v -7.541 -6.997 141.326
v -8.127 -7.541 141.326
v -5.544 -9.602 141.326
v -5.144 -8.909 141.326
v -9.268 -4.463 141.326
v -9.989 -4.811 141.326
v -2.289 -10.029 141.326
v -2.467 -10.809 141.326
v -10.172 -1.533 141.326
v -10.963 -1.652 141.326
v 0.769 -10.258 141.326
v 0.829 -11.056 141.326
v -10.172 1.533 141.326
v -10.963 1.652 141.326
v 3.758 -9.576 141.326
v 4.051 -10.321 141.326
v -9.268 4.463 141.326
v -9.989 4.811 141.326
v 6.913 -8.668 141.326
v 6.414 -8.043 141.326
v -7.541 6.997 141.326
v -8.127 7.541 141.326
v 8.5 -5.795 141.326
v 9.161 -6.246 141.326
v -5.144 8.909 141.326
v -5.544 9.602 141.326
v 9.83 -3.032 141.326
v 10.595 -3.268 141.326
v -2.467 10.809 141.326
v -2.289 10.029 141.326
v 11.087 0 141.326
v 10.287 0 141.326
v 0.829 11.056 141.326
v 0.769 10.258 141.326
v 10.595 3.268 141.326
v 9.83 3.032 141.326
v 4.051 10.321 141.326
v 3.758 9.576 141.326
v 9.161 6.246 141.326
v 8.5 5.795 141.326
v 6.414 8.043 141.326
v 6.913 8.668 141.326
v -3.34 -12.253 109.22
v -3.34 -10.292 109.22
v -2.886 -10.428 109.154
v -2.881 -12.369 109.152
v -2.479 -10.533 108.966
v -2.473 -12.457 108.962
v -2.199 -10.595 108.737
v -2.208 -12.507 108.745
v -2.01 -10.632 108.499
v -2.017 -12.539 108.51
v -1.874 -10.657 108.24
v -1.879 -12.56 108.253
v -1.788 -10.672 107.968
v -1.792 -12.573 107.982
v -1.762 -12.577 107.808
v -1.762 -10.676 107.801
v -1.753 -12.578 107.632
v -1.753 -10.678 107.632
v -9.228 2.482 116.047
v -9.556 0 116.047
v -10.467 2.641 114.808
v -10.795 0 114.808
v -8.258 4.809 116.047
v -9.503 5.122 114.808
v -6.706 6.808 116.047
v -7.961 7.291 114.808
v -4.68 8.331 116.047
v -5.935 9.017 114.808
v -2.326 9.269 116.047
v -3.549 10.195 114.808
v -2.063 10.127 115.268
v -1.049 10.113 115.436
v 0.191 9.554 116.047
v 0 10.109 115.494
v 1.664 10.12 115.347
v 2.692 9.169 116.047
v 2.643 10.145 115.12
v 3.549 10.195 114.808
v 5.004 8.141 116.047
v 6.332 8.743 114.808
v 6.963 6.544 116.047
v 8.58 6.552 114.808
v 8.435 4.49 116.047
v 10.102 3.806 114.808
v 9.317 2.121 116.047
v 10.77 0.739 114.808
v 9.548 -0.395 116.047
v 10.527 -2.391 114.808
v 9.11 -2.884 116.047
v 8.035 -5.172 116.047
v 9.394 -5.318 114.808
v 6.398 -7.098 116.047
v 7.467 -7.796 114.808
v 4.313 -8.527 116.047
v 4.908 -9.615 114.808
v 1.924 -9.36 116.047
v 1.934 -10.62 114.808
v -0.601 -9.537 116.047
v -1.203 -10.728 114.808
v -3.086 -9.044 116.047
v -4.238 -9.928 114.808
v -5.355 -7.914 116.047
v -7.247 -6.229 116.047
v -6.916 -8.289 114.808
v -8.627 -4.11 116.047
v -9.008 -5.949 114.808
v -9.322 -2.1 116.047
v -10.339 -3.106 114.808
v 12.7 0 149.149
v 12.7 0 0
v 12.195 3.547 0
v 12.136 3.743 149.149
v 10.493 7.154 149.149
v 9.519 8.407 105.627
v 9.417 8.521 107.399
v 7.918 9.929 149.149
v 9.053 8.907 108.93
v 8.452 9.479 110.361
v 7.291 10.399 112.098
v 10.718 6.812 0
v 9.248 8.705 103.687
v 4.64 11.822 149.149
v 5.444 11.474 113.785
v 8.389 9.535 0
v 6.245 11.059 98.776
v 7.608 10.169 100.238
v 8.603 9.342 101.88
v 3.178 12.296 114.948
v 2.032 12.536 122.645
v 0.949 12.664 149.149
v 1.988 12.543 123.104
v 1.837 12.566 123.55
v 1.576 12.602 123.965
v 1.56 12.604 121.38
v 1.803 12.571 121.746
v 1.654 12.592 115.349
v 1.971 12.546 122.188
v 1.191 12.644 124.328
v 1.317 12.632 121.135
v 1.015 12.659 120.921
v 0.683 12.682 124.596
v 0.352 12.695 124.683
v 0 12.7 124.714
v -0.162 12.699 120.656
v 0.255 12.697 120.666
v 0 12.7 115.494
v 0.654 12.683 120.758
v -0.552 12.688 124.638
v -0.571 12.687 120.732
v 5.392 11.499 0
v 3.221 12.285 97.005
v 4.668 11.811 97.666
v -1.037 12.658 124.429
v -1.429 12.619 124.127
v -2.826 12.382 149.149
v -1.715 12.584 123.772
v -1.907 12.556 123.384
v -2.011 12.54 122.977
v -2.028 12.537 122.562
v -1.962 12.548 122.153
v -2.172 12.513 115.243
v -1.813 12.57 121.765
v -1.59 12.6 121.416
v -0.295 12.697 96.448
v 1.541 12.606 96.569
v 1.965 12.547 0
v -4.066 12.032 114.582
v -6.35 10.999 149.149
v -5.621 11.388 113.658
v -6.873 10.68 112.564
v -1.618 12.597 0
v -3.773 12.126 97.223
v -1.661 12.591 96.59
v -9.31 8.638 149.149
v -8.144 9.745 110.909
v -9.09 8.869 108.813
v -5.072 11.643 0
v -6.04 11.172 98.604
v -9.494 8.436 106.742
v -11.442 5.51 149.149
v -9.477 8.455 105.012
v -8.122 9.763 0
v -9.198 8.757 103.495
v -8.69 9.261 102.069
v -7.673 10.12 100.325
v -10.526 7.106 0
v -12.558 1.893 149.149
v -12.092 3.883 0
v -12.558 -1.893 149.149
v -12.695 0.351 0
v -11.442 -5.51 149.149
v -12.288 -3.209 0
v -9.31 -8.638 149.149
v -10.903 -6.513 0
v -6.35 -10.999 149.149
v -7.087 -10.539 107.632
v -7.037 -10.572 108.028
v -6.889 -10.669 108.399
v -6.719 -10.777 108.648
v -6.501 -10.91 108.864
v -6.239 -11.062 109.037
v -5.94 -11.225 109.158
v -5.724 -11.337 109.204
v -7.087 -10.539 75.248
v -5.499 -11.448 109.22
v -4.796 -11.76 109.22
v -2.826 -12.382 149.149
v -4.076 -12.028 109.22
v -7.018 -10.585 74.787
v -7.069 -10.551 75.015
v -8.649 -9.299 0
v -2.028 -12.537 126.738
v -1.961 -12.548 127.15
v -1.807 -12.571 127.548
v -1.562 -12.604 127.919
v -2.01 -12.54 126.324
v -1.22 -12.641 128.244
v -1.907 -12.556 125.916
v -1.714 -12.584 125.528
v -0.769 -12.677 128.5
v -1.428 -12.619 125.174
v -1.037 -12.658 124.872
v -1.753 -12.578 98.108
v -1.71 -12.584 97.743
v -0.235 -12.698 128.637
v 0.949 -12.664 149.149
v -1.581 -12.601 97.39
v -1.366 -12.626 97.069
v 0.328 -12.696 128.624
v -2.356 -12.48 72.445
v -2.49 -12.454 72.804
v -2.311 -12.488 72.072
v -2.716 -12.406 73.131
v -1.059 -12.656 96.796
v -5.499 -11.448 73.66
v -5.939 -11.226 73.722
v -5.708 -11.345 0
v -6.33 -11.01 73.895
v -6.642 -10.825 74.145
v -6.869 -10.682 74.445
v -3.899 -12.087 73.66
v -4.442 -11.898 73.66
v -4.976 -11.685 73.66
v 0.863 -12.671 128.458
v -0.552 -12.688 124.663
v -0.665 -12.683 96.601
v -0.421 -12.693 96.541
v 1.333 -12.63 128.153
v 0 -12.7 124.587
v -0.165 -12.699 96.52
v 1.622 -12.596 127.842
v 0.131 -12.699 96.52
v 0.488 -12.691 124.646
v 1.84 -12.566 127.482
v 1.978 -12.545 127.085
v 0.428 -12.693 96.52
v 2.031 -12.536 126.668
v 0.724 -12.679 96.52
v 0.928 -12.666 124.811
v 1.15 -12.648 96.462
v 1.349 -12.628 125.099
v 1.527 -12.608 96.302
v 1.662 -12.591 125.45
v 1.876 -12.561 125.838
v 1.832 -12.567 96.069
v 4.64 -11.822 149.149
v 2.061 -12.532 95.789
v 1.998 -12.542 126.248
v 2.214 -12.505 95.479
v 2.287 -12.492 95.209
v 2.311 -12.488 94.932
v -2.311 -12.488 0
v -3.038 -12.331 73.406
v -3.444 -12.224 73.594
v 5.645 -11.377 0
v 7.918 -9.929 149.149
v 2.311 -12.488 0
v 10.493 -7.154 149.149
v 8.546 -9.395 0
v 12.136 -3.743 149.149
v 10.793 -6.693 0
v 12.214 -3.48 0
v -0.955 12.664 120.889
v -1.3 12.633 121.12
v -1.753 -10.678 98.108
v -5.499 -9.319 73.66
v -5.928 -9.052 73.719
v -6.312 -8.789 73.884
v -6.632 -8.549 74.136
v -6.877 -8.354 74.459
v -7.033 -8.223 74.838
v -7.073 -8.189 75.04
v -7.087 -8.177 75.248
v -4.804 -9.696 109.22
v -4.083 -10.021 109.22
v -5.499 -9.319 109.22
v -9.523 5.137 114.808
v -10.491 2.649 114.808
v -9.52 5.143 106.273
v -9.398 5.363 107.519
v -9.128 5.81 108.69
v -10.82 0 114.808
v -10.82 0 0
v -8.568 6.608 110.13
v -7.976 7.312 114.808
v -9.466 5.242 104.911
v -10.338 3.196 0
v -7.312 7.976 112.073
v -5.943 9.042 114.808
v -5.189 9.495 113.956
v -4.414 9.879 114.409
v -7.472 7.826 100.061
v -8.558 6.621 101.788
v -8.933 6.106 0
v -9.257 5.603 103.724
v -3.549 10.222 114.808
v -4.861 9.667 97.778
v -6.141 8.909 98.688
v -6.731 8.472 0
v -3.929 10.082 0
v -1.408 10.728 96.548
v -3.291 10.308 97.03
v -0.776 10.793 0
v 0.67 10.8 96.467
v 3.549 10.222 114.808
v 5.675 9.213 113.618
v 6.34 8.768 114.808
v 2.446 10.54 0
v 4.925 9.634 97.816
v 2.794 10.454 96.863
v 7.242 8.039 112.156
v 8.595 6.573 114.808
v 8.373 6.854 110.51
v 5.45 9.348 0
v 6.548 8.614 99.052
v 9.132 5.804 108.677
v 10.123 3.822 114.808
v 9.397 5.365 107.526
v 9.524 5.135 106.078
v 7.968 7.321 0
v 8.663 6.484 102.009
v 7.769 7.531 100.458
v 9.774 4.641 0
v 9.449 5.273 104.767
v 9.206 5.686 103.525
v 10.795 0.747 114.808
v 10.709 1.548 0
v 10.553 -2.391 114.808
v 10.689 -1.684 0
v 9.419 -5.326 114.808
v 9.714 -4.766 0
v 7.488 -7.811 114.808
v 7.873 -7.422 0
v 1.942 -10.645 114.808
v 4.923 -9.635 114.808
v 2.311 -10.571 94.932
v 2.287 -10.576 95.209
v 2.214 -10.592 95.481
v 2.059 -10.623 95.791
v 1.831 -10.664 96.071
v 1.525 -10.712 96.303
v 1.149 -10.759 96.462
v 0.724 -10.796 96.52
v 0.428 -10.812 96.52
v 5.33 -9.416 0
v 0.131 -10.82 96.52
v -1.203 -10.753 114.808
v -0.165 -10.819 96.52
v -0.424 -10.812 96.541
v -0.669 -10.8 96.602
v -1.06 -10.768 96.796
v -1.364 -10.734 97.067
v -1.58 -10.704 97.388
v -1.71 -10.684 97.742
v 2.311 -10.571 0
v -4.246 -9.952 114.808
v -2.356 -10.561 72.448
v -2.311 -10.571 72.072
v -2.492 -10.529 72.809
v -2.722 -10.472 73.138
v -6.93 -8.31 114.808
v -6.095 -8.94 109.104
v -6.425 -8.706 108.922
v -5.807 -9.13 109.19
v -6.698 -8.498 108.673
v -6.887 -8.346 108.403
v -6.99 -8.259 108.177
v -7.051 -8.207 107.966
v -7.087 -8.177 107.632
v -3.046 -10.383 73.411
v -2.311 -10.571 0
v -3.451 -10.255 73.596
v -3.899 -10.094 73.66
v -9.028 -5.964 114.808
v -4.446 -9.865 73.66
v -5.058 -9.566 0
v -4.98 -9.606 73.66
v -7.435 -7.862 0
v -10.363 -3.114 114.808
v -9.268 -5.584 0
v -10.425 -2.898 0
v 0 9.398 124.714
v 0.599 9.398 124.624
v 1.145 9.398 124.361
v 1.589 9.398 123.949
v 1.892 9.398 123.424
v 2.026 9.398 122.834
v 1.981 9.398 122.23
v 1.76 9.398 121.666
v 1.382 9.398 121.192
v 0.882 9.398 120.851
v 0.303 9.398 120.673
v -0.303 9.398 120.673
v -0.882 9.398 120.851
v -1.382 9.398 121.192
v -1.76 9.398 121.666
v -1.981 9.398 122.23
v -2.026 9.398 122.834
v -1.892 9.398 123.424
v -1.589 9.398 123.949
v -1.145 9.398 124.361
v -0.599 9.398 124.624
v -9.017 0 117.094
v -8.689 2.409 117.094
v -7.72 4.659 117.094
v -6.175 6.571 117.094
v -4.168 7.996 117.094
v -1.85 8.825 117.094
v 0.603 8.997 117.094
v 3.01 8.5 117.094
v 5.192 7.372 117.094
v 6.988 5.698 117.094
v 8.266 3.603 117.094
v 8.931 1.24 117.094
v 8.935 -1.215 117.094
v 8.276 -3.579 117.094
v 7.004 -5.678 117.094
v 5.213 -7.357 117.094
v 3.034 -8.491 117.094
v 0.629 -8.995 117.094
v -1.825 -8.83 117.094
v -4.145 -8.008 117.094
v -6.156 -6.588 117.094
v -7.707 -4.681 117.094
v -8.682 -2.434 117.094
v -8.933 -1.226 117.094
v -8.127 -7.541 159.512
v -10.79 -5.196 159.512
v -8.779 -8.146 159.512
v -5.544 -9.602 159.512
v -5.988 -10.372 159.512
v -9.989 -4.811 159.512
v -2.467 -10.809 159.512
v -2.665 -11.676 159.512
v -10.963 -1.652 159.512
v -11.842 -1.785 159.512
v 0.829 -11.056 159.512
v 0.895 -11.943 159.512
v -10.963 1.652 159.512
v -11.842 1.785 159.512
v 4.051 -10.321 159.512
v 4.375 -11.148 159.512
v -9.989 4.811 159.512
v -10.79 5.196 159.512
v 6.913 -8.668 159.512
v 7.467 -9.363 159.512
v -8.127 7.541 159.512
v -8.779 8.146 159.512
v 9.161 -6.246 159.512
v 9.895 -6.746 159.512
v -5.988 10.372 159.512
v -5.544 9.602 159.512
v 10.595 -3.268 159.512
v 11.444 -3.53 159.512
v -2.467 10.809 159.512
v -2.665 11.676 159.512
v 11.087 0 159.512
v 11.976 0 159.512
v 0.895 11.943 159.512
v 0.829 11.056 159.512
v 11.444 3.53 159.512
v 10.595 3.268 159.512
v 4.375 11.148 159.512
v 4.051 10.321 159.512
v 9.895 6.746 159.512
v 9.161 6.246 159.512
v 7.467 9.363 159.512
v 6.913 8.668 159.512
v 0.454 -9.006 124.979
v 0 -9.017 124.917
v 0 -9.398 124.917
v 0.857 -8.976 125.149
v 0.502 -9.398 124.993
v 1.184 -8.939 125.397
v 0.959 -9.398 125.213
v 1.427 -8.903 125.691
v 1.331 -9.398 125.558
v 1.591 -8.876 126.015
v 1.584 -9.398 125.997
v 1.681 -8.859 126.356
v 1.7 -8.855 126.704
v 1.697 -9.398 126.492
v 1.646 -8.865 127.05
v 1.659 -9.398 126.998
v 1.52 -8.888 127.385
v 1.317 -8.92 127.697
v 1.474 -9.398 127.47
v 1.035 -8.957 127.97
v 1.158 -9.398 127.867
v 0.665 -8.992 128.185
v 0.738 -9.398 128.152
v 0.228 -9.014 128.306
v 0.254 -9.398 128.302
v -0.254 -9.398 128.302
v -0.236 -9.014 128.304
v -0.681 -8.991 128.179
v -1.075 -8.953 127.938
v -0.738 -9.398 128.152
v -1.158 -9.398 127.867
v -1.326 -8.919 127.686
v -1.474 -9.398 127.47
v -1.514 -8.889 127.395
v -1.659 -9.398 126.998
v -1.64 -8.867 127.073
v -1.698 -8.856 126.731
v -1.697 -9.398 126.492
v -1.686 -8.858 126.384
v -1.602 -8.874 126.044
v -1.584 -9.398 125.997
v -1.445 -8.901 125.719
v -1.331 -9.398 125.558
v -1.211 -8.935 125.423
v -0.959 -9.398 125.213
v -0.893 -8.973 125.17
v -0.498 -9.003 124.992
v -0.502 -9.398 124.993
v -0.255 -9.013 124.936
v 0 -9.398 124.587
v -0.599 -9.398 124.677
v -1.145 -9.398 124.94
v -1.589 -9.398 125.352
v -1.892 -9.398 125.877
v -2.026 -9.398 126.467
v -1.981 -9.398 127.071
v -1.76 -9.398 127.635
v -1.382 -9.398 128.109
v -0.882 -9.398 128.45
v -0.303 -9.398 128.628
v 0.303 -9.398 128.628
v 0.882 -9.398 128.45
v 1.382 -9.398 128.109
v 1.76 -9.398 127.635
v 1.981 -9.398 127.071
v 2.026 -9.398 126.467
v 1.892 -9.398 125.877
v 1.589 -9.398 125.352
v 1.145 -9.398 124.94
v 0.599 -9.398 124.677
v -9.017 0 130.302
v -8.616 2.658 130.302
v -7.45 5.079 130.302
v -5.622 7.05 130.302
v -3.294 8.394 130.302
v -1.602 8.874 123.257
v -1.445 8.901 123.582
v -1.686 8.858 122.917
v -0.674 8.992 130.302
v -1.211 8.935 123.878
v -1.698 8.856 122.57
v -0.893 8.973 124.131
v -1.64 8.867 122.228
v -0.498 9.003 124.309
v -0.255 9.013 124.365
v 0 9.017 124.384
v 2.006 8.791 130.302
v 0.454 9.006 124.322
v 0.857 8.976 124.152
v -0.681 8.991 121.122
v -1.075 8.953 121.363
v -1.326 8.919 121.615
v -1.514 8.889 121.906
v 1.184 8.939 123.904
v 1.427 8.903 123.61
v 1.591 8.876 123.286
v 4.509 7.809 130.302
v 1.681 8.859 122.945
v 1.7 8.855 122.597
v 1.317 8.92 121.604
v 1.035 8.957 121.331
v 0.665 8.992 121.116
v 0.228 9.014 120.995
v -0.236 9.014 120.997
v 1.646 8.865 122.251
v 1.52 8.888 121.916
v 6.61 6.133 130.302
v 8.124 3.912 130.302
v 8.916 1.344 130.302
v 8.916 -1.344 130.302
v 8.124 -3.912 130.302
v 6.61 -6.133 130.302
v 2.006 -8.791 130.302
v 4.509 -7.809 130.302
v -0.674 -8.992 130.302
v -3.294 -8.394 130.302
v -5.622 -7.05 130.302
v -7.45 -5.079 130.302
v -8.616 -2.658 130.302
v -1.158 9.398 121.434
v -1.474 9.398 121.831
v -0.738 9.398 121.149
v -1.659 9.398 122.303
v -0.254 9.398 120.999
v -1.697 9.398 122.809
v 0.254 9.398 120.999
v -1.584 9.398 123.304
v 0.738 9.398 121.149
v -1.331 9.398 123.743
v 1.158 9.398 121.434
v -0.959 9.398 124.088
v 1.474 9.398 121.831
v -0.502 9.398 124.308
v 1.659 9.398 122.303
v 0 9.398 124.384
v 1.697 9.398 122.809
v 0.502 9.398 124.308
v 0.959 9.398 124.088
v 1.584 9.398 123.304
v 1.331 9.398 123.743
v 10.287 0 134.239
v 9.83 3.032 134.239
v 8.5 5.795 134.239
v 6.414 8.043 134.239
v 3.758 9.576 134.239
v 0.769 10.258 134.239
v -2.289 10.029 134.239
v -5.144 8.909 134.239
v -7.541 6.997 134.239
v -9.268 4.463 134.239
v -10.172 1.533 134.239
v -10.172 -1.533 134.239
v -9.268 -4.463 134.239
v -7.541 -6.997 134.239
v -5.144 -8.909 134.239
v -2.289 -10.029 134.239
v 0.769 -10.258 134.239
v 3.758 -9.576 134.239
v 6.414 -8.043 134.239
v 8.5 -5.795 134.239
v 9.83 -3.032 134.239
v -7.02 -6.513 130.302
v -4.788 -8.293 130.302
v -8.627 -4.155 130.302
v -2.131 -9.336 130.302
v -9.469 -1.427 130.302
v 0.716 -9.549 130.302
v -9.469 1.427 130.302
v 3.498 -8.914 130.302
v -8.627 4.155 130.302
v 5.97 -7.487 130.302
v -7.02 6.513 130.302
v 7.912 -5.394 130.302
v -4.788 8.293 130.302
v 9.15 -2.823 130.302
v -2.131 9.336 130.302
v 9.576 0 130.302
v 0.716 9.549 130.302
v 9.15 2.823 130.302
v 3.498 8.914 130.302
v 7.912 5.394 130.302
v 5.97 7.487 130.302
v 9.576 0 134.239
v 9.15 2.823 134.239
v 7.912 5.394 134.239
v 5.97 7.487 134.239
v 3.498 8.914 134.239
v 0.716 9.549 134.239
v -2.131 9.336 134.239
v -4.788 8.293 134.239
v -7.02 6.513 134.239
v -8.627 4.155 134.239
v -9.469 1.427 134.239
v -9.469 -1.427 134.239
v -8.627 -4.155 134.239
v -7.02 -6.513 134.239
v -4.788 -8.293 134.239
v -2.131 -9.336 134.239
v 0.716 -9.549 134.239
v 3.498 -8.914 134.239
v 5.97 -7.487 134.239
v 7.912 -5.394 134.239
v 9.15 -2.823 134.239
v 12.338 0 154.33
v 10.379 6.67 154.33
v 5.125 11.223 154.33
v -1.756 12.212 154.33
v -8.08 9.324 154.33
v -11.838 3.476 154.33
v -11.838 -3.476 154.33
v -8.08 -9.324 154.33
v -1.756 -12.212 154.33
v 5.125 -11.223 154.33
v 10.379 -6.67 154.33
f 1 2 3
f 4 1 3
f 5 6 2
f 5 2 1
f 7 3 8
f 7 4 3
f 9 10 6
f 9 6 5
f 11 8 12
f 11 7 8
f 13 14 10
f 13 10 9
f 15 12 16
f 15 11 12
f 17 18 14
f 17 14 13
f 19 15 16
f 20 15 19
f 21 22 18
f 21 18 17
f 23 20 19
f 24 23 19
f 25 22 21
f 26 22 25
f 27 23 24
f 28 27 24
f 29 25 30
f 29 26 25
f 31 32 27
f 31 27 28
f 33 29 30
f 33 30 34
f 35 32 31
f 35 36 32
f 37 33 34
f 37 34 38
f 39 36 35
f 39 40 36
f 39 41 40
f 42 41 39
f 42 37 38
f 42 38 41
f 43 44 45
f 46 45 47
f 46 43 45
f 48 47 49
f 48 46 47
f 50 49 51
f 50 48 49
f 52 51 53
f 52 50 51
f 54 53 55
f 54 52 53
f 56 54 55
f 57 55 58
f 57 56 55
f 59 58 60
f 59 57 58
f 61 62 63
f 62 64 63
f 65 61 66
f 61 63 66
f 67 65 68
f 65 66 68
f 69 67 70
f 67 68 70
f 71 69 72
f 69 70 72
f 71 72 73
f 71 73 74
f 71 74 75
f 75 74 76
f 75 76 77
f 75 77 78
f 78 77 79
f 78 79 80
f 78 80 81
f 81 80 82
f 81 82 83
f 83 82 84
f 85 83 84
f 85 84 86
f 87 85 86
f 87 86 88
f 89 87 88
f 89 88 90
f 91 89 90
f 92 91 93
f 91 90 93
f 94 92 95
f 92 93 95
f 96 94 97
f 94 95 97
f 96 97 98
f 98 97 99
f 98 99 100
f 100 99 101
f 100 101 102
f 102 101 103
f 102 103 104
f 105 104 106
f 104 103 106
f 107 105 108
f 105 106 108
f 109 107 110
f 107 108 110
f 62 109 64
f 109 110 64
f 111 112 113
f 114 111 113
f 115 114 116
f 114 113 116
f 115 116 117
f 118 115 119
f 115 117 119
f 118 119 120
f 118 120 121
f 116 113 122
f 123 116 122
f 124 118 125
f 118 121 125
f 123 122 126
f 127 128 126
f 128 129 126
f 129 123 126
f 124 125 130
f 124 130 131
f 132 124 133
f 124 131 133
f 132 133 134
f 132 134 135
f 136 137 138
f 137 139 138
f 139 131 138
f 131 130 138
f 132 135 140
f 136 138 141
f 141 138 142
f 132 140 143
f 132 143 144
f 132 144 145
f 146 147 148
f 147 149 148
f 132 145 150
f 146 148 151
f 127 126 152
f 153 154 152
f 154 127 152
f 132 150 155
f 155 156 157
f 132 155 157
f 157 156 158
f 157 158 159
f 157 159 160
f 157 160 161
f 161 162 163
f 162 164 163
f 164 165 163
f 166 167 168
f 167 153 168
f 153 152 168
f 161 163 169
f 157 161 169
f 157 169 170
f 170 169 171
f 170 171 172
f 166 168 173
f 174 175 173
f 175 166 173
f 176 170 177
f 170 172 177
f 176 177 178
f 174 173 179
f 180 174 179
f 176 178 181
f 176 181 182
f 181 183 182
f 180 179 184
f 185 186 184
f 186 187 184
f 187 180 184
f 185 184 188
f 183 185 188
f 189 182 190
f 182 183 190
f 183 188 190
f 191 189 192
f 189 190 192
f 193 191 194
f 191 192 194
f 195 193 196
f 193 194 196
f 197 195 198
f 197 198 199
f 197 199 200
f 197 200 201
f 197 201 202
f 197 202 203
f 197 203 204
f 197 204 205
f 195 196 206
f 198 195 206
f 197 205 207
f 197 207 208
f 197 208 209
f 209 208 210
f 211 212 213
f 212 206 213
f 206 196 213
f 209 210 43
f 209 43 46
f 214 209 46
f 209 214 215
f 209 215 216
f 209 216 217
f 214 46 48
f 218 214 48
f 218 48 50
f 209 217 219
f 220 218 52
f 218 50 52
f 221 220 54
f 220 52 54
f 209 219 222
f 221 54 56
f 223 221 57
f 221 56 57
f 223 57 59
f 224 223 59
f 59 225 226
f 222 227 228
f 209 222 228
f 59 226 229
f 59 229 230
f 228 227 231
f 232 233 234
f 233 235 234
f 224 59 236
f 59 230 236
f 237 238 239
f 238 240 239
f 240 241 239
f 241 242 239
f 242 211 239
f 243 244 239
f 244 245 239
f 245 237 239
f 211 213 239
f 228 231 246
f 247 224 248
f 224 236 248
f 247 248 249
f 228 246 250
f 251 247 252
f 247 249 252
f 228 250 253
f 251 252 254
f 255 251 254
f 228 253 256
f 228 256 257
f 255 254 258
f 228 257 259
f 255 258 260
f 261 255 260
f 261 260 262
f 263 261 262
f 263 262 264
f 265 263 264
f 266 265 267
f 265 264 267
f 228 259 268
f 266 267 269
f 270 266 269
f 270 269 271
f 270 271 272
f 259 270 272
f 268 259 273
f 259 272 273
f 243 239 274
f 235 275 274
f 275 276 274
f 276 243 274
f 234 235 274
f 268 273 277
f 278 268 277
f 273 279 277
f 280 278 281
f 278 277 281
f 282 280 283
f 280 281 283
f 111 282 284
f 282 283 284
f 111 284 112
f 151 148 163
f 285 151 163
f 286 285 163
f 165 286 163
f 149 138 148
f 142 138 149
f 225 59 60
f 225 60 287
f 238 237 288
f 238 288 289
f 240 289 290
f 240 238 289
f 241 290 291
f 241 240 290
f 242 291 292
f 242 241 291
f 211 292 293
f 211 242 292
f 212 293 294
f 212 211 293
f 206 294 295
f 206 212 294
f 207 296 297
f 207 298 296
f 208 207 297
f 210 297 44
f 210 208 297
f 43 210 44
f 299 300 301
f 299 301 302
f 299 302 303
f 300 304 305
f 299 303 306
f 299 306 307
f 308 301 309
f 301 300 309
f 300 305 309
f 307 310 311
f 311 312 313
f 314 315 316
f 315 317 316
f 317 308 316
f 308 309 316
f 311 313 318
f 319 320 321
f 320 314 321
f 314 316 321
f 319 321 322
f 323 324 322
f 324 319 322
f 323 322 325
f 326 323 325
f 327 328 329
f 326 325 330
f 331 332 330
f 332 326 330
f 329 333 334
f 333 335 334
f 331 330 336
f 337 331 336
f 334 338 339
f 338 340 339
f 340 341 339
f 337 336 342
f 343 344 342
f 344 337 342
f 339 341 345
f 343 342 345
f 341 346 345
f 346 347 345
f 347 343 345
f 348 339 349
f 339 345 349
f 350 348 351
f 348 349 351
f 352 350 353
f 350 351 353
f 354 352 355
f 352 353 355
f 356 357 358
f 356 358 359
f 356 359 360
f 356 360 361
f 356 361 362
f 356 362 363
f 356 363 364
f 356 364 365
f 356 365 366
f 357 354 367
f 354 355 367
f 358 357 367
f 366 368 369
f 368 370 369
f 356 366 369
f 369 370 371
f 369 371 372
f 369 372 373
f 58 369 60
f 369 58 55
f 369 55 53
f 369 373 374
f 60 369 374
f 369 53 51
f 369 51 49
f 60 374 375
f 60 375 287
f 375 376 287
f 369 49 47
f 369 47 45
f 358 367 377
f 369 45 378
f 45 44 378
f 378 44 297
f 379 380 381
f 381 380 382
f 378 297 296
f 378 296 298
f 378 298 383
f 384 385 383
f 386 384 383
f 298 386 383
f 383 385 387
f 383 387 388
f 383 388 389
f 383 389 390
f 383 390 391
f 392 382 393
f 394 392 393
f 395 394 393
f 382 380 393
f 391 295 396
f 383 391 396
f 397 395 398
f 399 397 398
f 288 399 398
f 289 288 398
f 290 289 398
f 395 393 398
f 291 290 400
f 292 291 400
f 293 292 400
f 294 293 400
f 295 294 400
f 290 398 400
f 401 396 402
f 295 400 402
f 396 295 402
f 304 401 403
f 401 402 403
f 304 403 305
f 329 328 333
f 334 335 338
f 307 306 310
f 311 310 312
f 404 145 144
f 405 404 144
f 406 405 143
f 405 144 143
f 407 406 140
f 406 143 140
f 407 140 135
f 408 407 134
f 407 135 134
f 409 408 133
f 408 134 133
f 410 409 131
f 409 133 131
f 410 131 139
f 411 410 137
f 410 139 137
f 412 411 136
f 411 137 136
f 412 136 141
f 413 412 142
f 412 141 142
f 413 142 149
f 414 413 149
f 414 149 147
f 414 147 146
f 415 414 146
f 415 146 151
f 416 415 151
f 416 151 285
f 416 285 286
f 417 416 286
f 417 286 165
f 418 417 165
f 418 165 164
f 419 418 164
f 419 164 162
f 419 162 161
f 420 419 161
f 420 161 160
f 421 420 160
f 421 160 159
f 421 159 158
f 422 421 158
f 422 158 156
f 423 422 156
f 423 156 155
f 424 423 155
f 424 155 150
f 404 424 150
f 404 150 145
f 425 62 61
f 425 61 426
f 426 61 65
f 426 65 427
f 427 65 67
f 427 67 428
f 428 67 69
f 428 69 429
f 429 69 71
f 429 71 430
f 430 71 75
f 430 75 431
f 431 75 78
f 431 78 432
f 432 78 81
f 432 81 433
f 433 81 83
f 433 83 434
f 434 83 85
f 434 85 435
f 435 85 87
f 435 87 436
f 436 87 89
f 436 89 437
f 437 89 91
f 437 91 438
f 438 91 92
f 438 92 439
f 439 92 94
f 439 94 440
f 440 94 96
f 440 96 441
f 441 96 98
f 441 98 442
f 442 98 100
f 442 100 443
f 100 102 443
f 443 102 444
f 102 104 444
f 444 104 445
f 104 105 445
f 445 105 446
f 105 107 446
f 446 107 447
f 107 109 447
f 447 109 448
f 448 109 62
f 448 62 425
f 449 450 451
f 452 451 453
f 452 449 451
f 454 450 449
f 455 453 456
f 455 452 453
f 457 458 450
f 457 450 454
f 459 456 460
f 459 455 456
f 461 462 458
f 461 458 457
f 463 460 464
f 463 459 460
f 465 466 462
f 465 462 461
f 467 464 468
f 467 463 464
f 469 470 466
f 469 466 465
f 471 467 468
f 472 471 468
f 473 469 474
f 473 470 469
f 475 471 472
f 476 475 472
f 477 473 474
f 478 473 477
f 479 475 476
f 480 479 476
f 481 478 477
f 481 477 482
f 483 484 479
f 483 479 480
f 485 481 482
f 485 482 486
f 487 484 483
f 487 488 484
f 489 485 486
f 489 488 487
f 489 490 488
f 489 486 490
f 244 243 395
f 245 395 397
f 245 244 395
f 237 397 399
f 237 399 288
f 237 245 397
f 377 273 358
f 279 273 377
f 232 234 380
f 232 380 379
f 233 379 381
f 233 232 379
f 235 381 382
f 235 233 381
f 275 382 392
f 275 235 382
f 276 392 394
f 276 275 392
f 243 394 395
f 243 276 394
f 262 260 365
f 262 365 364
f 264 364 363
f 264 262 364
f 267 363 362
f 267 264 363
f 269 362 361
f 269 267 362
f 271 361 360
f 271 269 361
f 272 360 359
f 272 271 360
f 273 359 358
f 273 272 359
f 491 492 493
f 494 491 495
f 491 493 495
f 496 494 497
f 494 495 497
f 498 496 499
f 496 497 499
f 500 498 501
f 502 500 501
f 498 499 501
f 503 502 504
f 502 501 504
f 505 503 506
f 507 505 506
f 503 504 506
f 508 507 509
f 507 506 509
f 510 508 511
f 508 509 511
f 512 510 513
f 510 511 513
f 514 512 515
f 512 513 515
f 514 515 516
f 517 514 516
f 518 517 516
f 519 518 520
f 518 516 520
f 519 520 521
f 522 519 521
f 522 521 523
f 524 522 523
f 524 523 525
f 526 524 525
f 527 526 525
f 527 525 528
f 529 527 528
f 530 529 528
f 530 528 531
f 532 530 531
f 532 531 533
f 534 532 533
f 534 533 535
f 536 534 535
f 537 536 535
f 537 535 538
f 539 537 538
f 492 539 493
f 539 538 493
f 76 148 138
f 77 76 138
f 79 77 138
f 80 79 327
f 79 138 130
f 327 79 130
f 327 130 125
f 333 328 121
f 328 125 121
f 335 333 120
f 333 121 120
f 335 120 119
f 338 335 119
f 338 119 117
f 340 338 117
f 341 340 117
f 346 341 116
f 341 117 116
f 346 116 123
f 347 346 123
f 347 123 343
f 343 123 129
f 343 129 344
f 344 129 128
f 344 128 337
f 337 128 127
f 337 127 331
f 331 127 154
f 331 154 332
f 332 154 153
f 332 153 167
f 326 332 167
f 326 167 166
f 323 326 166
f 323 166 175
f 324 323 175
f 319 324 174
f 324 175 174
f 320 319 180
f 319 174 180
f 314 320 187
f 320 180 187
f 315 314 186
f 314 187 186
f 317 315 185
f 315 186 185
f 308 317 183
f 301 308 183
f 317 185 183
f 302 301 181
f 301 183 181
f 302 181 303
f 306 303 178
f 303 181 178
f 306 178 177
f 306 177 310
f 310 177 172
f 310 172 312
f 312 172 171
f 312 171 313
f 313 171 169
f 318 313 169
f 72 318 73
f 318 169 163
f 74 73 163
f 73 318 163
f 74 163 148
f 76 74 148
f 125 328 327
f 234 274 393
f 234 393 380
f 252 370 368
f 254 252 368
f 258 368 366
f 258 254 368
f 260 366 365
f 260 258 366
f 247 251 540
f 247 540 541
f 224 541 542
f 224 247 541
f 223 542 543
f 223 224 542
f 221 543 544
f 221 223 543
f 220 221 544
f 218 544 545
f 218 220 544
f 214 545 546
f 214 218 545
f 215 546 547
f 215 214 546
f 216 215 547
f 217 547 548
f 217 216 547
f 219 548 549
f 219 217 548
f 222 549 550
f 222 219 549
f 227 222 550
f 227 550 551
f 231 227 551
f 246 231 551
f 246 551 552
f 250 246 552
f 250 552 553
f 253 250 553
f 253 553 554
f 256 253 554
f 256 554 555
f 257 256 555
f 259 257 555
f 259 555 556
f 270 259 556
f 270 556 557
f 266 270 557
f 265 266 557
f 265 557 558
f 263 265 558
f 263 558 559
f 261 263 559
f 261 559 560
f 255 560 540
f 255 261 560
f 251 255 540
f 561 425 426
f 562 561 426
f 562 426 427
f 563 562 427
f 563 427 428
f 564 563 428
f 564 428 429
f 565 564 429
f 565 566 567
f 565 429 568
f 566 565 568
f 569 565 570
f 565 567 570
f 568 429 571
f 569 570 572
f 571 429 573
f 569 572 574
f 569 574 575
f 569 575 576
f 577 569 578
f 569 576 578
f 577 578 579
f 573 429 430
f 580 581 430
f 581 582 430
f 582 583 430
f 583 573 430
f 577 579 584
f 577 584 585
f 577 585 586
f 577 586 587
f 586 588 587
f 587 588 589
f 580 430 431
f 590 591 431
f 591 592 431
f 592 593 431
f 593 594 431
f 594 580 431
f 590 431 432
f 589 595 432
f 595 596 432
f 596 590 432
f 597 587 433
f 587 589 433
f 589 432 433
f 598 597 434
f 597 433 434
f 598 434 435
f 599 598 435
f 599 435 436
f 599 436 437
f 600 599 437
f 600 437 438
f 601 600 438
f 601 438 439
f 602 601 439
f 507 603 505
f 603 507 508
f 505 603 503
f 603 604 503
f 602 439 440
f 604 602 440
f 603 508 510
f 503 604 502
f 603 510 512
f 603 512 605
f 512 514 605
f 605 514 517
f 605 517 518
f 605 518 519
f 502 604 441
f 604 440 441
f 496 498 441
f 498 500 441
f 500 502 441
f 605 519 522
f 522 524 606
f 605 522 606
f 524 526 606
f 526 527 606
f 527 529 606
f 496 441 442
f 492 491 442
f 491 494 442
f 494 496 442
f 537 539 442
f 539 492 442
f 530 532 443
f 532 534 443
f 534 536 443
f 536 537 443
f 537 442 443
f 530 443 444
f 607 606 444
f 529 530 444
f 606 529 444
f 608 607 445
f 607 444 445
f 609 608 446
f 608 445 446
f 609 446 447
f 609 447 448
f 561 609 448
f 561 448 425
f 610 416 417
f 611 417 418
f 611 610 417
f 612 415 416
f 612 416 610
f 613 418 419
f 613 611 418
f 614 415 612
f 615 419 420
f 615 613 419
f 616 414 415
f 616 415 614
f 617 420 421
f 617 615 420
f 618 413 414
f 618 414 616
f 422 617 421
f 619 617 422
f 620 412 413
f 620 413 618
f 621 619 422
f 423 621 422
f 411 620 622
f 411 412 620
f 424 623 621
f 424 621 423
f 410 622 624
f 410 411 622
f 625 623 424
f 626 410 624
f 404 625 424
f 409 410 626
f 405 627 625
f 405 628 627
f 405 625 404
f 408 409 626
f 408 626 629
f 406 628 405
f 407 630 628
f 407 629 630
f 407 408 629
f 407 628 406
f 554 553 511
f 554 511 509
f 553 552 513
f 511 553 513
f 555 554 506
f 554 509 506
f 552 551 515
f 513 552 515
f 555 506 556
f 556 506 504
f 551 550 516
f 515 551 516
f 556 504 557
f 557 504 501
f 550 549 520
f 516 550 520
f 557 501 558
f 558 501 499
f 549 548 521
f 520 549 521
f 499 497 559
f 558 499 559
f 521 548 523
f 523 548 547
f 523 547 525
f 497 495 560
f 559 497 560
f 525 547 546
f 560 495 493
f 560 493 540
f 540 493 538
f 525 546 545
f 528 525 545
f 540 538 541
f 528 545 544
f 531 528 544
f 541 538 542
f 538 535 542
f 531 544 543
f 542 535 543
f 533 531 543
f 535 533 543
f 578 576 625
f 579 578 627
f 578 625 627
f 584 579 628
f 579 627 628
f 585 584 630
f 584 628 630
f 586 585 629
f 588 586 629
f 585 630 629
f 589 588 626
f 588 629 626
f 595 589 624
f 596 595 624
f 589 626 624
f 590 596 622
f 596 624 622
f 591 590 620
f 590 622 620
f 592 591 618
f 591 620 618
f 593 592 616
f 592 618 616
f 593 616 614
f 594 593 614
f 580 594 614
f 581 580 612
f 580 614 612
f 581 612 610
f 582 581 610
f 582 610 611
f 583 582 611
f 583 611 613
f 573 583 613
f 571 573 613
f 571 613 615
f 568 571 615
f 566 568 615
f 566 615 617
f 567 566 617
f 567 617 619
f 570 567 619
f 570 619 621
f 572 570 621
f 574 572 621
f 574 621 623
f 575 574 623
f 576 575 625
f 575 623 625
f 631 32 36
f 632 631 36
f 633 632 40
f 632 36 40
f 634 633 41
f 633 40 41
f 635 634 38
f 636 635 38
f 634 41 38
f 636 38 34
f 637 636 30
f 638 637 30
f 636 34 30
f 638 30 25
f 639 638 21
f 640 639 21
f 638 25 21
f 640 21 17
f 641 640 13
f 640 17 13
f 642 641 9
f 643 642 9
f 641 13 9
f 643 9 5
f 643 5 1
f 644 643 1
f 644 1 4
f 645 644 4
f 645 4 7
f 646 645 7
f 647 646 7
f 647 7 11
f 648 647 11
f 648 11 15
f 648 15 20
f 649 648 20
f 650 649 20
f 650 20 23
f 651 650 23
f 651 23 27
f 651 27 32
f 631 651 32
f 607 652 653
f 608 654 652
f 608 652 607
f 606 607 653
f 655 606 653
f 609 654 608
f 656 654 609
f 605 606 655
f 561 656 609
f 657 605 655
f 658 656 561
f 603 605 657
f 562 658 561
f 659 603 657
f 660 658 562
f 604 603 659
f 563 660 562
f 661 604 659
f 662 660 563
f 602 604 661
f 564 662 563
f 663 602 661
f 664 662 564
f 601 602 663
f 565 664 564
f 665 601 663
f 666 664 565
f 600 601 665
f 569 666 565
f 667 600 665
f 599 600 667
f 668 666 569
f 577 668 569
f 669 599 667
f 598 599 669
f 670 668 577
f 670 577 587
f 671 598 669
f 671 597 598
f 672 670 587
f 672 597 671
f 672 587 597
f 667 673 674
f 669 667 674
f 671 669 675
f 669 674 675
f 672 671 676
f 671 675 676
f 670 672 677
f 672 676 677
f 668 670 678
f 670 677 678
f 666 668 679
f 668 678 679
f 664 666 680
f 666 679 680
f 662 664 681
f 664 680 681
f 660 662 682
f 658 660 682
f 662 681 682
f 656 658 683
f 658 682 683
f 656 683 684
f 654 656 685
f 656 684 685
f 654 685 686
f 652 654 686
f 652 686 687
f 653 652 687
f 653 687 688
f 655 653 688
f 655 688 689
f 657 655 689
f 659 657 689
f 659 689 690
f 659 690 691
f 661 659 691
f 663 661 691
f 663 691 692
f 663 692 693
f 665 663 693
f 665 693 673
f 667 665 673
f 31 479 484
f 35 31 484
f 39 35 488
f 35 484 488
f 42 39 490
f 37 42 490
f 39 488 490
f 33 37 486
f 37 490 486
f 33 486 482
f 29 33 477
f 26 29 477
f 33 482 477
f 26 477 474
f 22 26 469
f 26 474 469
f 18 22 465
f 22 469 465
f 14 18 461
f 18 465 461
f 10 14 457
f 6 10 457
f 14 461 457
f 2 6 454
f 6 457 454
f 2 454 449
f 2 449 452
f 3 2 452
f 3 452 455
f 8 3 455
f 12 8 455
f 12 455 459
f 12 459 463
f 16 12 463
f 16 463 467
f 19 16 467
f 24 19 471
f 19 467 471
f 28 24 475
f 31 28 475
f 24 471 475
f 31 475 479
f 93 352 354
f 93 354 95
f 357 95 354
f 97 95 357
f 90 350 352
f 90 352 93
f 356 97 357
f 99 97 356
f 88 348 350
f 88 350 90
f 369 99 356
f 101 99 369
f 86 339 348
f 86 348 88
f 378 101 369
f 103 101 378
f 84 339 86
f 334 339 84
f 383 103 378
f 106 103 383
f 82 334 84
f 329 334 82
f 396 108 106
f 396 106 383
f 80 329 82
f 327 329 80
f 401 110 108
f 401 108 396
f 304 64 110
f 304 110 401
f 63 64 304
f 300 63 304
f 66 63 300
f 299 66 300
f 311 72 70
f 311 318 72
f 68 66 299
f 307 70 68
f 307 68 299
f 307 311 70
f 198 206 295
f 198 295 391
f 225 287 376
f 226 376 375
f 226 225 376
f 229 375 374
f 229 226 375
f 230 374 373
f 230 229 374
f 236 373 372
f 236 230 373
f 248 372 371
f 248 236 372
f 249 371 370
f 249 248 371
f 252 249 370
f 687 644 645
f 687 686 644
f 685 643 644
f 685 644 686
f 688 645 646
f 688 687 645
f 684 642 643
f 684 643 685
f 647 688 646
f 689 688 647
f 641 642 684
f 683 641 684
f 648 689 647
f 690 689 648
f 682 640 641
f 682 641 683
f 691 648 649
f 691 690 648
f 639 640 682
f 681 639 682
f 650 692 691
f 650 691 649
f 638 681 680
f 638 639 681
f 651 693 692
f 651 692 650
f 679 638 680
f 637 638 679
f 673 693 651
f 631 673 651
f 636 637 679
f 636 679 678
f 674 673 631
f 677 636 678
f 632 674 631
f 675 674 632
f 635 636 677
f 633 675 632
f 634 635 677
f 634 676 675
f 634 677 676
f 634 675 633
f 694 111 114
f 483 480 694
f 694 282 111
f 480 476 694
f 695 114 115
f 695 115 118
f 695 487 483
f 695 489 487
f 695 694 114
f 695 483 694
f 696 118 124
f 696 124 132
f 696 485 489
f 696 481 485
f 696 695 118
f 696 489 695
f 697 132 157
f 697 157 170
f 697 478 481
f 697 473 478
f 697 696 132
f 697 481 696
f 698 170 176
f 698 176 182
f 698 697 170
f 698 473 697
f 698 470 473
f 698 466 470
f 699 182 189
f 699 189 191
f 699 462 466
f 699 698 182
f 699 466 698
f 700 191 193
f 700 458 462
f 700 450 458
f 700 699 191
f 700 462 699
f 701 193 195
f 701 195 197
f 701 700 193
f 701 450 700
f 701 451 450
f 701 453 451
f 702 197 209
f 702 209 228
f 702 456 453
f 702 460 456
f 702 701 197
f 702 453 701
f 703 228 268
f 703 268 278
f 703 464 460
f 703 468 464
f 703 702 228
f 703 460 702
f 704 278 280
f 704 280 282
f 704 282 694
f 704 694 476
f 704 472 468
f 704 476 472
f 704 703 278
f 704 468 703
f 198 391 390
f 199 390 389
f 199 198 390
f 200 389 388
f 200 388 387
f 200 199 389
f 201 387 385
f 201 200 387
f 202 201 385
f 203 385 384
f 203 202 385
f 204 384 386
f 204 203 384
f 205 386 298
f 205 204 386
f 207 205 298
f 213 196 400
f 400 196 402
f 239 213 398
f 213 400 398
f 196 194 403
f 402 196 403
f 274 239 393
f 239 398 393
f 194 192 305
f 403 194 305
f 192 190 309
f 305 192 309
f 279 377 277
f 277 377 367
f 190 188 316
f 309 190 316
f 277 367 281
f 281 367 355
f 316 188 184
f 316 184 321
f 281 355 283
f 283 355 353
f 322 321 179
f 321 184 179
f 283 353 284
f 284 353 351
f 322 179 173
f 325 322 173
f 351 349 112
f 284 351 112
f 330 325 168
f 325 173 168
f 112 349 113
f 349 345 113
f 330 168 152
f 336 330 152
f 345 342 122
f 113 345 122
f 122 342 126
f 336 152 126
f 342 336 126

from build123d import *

# Parameters (mm, degrees)
SKETCH1_R           = 12.7
EXTRUDE1_DEPTH      = 159.512
SKETCH3_R           = 10.8204
CUT_EXTRUDE1_DEPTH  = 114.808
SKETCH4_R           = 9.017
CUT_EXTRUDE2_DEPTH  = 45.704
CHAMFER1_SIZE       = 1.778
CHAMFER2_SIZE       = 0.762
CHAMFER2_SIZE2      = 0.508
SKETCH5_R           = 9.5758
CUT_EXTRUDE3_DEPTH  = 29.21
SKETCH8_R           = 10.287
CUT_EXTRUDE5_DEPTH  = 25.273
SKETCH9_R           = 11.0871
CUT_EXTRUDE6_DEPTH  = 18.1864
CHAMFER3_SIZE       = 10.3632
CHAMFER3_SIZE2      = 0.7239
CUT_EXTRUDE7_DEPTH  = 7.62
SKETCH11_R          = 2.032
CUT_EXTRUDE11_DEPTH = 3.302
SKETCH15_R          = 1.7018
CUT_EXTRUDE12_DEPTH = 3.302
SKETCH16_R          = 9.525
CUT_EXTRUDE13_DEPTH = 12.7
SKETCH17_R          = 2.032
CUT_EXTRUDE14_DEPTH = 3.302
SKETCH18_R          = 1.7018
CUT_EXTRUDE15_DEPTH = 3.302


with BuildPart() as part:
    # Sketch1 → Extrude1 (new body)
    with BuildSketch(Plane.XY):
        Circle(SKETCH1_R)
    extrude(amount=EXTRUDE1_DEPTH)

    # Sketch3 → Cut-Extrude1 (cut)
    with BuildSketch(Plane(origin=(0, 0, 0), x_dir=(-1, 0, 0), z_dir=(0, 0, -1))):
        Circle(SKETCH3_R)
    extrude(amount=-CUT_EXTRUDE1_DEPTH, mode=Mode.SUBTRACT)

    # Sketch4 → Cut-Extrude2 (cut, through all)
    with BuildSketch(Plane(origin=(0, 0, 114.808), x_dir=(-1, 0, 0), z_dir=(0, 0, -1))):
        Circle(SKETCH4_R)
    extrude(amount=-CUT_EXTRUDE2_DEPTH, mode=Mode.SUBTRACT)

    # Chamfer1
    chamfer1_edges = [part.edges().sort_by_distance(p)[0] for p in [
        (9.017, 0, 114.808),
    ]]
    chamfer(chamfer1_edges, length=CHAMFER1_SIZE)

    # Chamfer2
    chamfer2_edges = [part.edges().sort_by_distance(p)[0] for p in [
        (9.017, 0, 116.586),
    ]]
    chamfer2_side = [part.faces().sort_by_distance(p)[0] for p in [
        (9.906, 0, 115.697),
    ]]
    chamfer(chamfer2_edges, length=CHAMFER2_SIZE, length2=CHAMFER2_SIZE2, reference=chamfer2_side[0])

    # Sketch5 → Cut-Extrude3 (cut)
    with BuildSketch(Plane.XY.offset(159.512)):
        Circle(SKETCH5_R)
    extrude(amount=-CUT_EXTRUDE3_DEPTH, mode=Mode.SUBTRACT)

    # Sketch8 → Cut-Extrude5 (cut)
    with BuildSketch(Plane.XY.offset(159.512)):
        Circle(SKETCH8_R)
    extrude(amount=-CUT_EXTRUDE5_DEPTH, mode=Mode.SUBTRACT)

    # Sketch9 → Cut-Extrude6 (cut)
    with BuildSketch(Plane.XY.offset(159.512)):
        Circle(SKETCH9_R)
    extrude(amount=-CUT_EXTRUDE6_DEPTH, mode=Mode.SUBTRACT)

    # Chamfer3
    chamfer3_edges = [part.edges().sort_by_distance(p)[0] for p in [
        (-12.7, 0, 159.512),
    ]]
    chamfer3_side = [part.faces().sort_by_distance(p)[0] for p in [
        (-12.7, 0, 79.756),
    ]]
    chamfer(chamfer3_edges, length=CHAMFER3_SIZE, length2=CHAMFER3_SIZE2, reference=chamfer3_side[0])

    # Sketch10 → Cut-Extrude7 (cut)
    with BuildSketch(Plane(origin=(0, -12.7, 0), x_dir=(-1, 0, 0), z_dir=(0, 1, 0))):
        with BuildLine():
            Line((2.3114, 0), (2.3114, 72.0725))
            ThreePointArc((2.3114, 72.0725), (2.776367985, 73.195032015), (3.8989, 73.66))
            Line((3.8989, 73.66), (5.4991, 73.66))
            ThreePointArc((5.4991, 73.66), (6.621632015, 74.124967985), (7.0866, 75.2475))
            Line((7.0866, 75.2475), (7.0866, 107.6325))
            ThreePointArc((7.0866, 107.6325), (6.621632015, 108.755032015), (5.4991, 109.22))
            Line((5.4991, 109.22), (3.3401, 109.22))
            ThreePointArc((3.3401, 109.22), (2.217567985, 108.755032015), (1.7526, 107.6325))
            Line((1.7526, 107.6325), (1.7526, 98.1075))
            ThreePointArc((1.7526, 98.1075), (1.287632015, 96.984967985), (0.1651, 96.52))
            Line((0.1651, 96.52), (-0.7239, 96.52))
            ThreePointArc((-0.7239, 96.52), (-1.846432015, 96.055032015), (-2.3114, 94.9325))
            Line((-2.3114, 94.9325), (-2.3114, 0))
            Line((-2.3114, 0), (2.3114, 0))
        make_face()
    extrude(amount=CUT_EXTRUDE7_DEPTH, mode=Mode.SUBTRACT)

    # Sketch11 → Cut-Extrude11 (cut)
    with BuildSketch(Plane(origin=(0, -12.7, 0), x_dir=(-1, 0, 0), z_dir=(0, 1, 0))):
        with Locations(Location((0, 126.619, 0), (0, 0, 270))):  # turned: the seam where the file's is
            Circle(SKETCH11_R)
    extrude(amount=CUT_EXTRUDE11_DEPTH, mode=Mode.SUBTRACT)

    # Sketch15 → Cut-Extrude12 (cut)
    with BuildSketch(Plane.XZ.offset(9.398)):
        with Locations(Location((0, 126.619, 0), (0, 0, 270))):  # turned: the seam where the file's is
            Circle(SKETCH15_R)
    extrude(amount=-CUT_EXTRUDE12_DEPTH, mode=Mode.SUBTRACT)

    # Sketch16 → Cut-Extrude13 (cut)
    with BuildSketch(Plane(origin=(0, 12.7, 0), x_dir=(-1, 0, 0), z_dir=(0, 1, 0))):
        with Locations(Location((0, 105.9688, 0), (0, 0, 90))):  # turned: the seam where the file's is
            Circle(SKETCH16_R)
    extrude(amount=-CUT_EXTRUDE13_DEPTH, mode=Mode.SUBTRACT)

    # Sketch17 → Cut-Extrude14 (cut)
    with BuildSketch(Plane(origin=(0, 12.7, 0), x_dir=(-1, 0, 0), z_dir=(0, 1, 0))):
        with Locations(Location((0, 122.682, 0), (0, 0, 90))):  # turned: the seam where the file's is
            Circle(SKETCH17_R)
    extrude(amount=-CUT_EXTRUDE14_DEPTH, mode=Mode.SUBTRACT)

    # Sketch18 → Cut-Extrude15 (cut)
    with BuildSketch(Plane(origin=(0, 9.398, 0), x_dir=(-1, 0, 0), z_dir=(0, 1, 0))):
        with Locations(Location((0, 122.682, 0), (0, 0, 90))):  # turned: the seam where the file's is
            Circle(SKETCH18_R)
    extrude(amount=-CUT_EXTRUDE15_DEPTH, mode=Mode.SUBTRACT)


solid = part.part
